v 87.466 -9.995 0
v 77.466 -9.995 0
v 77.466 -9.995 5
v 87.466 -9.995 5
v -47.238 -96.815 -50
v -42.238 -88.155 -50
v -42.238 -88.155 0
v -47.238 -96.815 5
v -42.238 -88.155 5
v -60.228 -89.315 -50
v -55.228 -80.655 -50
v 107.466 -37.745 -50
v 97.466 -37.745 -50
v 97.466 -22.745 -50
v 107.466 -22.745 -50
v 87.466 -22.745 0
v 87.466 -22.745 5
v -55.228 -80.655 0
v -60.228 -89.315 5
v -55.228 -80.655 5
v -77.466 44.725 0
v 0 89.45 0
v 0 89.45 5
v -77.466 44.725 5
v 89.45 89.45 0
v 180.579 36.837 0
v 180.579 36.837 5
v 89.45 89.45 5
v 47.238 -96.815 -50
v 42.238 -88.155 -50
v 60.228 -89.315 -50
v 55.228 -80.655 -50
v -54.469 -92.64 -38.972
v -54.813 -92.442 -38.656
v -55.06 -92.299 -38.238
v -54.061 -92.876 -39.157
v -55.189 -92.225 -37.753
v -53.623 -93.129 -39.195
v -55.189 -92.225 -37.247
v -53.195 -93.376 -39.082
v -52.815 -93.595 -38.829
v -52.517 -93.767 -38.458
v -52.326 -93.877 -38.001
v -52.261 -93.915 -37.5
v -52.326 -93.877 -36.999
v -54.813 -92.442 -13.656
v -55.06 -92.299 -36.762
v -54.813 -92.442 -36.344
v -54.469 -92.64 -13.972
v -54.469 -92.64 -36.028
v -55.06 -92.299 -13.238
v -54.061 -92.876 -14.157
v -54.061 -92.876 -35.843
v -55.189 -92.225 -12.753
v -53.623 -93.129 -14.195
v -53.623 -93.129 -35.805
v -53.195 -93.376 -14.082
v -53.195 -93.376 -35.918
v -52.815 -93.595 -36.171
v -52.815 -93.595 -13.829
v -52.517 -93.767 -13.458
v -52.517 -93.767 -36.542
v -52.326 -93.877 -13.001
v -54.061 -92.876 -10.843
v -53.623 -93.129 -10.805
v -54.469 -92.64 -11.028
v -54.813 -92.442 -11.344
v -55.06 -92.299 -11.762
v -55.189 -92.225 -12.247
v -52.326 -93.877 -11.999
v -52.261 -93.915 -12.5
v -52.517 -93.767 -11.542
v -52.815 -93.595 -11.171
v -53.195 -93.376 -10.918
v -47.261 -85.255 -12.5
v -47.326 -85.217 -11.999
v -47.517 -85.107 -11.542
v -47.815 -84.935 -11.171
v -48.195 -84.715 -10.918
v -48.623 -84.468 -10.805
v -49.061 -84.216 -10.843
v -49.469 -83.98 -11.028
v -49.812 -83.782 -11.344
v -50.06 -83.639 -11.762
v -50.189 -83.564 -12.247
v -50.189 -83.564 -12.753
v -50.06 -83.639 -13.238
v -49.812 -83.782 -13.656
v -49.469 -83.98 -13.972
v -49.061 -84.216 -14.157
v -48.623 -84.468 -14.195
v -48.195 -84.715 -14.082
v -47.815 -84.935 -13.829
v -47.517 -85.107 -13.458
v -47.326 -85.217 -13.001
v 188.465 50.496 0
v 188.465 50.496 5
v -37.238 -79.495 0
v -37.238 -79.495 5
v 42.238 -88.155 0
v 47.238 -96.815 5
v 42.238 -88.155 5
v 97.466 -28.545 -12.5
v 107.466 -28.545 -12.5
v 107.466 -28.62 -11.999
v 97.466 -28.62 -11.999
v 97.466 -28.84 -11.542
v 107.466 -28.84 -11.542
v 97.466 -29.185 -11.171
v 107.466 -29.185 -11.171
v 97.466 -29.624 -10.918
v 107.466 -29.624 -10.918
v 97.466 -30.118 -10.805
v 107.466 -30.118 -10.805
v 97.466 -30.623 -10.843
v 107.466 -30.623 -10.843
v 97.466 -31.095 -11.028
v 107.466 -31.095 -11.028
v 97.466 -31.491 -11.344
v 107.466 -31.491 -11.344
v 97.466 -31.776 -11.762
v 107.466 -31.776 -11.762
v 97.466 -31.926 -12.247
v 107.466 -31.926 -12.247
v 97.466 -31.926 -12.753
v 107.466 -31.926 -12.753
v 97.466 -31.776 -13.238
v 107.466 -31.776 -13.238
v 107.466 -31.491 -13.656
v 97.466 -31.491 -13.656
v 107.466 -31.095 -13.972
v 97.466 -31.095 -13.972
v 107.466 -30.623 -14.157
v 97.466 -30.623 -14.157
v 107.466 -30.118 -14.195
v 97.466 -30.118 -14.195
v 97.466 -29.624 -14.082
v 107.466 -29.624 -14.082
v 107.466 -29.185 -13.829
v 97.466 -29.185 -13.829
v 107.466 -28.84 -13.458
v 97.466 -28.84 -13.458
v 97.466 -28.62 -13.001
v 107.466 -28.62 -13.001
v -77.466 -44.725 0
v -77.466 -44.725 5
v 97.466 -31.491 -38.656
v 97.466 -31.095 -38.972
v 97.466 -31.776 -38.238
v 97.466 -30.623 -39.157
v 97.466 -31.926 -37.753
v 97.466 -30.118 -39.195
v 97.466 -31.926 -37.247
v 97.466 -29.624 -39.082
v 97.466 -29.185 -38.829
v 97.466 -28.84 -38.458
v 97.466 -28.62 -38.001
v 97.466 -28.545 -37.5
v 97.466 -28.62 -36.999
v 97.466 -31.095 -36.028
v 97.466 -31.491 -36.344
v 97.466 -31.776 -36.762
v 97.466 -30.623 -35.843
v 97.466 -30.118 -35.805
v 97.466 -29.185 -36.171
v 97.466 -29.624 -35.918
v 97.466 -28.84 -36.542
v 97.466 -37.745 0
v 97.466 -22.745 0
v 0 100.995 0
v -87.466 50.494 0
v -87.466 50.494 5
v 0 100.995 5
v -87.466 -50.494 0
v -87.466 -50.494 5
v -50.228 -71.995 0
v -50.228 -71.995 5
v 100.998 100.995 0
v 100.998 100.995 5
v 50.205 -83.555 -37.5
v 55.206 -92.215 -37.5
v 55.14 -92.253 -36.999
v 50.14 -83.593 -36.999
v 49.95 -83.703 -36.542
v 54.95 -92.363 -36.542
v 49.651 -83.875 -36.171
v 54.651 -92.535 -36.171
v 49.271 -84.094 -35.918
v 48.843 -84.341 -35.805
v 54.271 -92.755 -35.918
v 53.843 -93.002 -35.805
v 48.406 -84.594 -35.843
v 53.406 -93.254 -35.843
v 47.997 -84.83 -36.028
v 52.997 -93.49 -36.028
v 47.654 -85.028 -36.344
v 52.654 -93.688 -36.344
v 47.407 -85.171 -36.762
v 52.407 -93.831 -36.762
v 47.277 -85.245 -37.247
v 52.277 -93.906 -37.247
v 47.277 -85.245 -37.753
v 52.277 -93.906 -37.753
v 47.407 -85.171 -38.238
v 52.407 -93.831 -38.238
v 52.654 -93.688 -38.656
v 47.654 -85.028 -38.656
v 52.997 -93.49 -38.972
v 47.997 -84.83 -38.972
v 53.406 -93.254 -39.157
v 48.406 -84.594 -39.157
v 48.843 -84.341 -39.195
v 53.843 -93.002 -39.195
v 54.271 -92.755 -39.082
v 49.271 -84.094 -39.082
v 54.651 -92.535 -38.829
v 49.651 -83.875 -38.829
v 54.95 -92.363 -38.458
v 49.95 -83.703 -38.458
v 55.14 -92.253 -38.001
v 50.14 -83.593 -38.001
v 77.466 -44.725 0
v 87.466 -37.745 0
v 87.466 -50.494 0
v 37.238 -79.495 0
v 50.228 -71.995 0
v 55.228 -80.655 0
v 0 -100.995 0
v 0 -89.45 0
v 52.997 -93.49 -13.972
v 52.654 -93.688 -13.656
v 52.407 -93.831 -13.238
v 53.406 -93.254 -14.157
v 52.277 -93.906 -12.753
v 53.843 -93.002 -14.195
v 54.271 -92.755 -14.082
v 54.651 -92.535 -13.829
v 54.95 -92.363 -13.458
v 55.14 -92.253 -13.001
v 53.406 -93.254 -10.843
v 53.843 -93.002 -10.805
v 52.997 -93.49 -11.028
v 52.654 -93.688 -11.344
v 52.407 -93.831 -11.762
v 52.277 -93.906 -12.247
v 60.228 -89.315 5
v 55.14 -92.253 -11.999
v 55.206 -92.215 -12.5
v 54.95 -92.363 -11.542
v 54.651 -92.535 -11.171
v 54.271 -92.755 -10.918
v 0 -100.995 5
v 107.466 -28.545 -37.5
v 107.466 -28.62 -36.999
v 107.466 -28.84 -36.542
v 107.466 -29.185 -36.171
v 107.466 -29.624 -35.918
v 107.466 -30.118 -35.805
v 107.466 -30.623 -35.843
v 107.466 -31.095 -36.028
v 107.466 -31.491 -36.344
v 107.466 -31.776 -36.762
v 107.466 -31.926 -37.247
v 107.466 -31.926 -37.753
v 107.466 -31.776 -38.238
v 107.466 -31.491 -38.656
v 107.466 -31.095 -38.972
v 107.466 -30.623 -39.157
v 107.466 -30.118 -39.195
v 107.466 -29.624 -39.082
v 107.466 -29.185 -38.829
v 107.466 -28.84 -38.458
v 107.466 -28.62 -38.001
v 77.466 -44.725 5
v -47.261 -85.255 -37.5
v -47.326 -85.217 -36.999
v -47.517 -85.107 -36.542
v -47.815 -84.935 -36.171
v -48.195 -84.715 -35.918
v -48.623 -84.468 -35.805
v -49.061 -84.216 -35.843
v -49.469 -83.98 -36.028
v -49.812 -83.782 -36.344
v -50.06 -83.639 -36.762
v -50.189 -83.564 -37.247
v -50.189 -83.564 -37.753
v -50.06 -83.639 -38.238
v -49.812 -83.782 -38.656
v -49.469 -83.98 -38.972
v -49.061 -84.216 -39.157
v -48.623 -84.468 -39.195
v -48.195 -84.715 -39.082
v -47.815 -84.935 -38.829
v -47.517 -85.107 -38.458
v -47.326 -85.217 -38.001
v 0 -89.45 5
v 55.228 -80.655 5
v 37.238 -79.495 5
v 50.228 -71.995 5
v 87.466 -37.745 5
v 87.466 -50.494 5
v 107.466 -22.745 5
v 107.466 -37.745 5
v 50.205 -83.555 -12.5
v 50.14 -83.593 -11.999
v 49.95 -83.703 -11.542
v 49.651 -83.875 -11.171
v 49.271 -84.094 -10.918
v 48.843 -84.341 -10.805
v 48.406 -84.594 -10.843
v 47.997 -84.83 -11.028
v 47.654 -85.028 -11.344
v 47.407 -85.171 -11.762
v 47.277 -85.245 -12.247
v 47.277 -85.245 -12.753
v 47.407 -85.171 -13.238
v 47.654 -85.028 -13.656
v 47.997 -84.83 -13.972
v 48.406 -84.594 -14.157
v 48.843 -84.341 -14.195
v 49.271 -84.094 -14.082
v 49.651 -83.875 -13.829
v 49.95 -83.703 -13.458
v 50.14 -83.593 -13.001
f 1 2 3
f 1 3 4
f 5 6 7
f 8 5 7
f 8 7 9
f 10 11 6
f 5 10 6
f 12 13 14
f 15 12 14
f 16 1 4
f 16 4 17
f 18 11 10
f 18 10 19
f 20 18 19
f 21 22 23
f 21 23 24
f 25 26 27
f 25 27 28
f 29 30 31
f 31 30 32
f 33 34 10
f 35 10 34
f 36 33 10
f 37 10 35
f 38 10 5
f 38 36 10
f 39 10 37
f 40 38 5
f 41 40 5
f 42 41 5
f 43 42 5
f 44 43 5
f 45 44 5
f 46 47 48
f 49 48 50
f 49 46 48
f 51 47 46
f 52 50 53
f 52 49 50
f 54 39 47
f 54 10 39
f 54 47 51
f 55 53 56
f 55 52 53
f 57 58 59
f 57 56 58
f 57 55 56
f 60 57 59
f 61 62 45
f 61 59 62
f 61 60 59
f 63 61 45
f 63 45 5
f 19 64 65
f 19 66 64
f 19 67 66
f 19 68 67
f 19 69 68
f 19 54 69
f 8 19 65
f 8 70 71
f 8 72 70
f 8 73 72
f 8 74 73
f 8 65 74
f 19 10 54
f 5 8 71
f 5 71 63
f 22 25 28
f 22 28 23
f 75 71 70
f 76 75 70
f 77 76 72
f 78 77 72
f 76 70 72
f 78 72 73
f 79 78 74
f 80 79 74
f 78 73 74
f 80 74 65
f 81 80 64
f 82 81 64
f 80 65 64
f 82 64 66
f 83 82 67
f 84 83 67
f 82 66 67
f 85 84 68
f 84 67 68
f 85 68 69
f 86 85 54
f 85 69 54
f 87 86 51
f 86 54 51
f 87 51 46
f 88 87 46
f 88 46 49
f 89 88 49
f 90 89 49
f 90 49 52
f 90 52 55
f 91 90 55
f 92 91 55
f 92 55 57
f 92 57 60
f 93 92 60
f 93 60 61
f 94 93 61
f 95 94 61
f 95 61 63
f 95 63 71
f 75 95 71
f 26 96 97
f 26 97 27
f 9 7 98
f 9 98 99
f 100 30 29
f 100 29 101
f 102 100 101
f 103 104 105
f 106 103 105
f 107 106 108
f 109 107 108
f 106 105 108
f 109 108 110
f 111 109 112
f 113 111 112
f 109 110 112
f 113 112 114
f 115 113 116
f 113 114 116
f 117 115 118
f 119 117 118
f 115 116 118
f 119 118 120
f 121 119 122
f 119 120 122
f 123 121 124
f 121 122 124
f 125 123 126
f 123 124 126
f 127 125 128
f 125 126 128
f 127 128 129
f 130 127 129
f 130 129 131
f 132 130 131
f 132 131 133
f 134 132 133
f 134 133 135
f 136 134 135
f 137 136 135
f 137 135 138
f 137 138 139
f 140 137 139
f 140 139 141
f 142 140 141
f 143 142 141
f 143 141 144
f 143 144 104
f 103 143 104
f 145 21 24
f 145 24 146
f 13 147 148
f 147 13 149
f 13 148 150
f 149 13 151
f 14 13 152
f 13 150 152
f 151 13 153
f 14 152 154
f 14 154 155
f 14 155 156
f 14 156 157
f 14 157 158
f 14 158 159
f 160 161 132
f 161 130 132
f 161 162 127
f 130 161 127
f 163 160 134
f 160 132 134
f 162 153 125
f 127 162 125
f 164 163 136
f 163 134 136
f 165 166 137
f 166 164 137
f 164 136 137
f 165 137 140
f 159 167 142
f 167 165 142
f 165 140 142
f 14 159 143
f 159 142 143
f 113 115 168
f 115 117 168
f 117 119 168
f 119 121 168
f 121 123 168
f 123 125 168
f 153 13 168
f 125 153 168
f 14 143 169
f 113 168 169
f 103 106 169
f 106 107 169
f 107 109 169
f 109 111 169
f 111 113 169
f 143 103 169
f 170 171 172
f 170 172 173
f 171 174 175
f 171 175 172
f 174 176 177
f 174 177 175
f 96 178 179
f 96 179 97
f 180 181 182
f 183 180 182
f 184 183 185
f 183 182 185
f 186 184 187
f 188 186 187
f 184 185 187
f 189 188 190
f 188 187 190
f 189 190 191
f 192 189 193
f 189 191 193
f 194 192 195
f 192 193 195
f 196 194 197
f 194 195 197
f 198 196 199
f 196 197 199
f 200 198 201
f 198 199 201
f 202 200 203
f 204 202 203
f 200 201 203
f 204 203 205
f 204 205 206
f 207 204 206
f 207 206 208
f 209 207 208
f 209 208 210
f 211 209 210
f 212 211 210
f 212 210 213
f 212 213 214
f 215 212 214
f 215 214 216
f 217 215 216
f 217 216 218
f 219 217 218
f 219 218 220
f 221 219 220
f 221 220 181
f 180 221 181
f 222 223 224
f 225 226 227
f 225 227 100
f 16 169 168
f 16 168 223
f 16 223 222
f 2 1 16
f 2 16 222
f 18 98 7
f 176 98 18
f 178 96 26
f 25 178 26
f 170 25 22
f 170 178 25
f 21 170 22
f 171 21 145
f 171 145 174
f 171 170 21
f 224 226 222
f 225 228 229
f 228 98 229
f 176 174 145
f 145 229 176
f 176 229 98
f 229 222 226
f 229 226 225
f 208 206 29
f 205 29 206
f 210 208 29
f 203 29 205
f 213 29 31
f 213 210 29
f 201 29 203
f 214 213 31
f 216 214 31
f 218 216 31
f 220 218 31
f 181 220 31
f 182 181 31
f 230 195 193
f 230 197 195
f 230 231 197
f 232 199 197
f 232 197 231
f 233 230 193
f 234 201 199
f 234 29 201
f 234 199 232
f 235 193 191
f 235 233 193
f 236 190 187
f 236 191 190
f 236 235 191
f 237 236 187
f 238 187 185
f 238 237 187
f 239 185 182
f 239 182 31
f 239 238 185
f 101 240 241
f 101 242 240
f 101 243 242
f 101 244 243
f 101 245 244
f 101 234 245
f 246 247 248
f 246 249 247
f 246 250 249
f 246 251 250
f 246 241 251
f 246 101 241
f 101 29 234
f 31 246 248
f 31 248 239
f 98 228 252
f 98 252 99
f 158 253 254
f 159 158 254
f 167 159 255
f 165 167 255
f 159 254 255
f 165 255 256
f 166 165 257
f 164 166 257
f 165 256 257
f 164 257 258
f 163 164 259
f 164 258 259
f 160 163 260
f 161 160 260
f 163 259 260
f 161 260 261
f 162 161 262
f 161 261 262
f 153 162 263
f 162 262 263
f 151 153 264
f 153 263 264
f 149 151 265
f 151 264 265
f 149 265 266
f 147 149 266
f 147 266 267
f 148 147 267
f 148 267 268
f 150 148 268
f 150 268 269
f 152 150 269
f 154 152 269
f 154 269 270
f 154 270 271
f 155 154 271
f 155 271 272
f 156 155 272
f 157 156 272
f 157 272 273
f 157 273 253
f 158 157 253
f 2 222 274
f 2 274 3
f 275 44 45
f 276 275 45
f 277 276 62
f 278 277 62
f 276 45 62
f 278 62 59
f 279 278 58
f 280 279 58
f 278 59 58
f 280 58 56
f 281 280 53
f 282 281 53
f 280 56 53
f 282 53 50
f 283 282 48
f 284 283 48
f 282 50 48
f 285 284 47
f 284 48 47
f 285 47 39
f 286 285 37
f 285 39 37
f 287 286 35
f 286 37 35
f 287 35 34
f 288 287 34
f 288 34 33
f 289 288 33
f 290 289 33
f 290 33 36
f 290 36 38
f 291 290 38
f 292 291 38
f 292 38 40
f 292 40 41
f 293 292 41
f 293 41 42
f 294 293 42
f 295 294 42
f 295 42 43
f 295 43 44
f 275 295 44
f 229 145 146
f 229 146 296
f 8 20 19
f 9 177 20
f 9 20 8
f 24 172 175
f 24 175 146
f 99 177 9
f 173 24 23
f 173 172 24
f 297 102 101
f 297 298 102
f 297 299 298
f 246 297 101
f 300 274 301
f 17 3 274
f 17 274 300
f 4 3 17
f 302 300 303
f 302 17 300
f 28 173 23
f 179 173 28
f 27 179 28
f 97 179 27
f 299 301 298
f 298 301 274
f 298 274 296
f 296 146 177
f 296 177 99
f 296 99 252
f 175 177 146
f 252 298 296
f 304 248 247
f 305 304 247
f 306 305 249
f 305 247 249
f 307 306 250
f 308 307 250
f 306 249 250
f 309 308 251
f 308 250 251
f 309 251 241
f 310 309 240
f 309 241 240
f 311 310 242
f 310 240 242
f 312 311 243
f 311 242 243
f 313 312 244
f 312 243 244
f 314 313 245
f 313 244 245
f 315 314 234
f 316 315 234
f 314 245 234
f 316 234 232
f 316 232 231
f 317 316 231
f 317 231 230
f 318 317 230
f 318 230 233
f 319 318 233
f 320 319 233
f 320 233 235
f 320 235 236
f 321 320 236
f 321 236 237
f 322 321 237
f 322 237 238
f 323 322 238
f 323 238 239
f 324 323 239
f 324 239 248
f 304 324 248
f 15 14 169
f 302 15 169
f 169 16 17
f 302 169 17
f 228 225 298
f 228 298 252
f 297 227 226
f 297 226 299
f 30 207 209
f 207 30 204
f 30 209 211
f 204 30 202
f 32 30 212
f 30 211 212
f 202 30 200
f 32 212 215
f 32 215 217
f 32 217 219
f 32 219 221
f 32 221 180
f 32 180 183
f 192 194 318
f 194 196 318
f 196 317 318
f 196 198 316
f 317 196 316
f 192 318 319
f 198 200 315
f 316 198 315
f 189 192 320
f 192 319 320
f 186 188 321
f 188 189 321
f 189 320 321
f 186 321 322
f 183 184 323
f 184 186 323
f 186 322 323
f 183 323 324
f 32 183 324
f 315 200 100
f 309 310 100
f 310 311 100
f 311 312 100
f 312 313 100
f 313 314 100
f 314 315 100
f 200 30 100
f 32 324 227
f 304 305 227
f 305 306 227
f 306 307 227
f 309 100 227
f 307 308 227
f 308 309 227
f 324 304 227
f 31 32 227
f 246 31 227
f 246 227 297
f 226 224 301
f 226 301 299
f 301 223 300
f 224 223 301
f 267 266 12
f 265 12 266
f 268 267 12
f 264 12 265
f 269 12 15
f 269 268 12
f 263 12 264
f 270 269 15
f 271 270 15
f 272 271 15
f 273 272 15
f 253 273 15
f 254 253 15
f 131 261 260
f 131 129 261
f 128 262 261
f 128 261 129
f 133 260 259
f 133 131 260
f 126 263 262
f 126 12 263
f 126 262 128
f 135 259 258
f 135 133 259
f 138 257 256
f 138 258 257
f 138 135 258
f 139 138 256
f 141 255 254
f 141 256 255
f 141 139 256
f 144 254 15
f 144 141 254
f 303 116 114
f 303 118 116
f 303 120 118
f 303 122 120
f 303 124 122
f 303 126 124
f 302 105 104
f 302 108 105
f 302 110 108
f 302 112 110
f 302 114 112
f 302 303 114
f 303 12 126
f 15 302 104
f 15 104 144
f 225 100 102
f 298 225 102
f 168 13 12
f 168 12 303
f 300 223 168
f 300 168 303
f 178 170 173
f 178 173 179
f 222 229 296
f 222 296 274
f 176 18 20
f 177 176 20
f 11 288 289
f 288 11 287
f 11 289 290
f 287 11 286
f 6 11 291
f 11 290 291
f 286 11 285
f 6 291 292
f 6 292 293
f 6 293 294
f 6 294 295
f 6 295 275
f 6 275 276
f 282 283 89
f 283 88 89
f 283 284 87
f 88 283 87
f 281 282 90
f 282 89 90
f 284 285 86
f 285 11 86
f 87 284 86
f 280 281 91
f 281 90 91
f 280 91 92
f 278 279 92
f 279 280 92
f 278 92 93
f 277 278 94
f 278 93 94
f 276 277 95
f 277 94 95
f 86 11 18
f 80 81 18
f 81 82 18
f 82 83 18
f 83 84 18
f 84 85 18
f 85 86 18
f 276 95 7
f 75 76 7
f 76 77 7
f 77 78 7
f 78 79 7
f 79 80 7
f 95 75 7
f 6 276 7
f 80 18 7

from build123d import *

# Parameters (mm, degrees)
PAD_DEPTH      = 5
SKETCH001_W    = 15
SKETCH001_H    = 5
PAD001_DEPTH   = 10
SKETCH002_W    = 15
SKETCH002_H    = 5
PAD002_DEPTH   = 10
SKETCH003_W    = 15
SKETCH003_H    = 5
PAD003_DEPTH   = 10
SKETCH004_W    = 15
SKETCH004_H    = 55
PAD004_DEPTH   = 10
SKETCH005_R    = 1.7
HOLE_DEPTH     = 25
HOLE_TIPS_R    = 1.7
SKETCH006_W    = 15
SKETCH006_H    = 55
PAD005_DEPTH   = 10
SKETCH007_R    = 1.7
HOLE001_DEPTH  = 25
HOLE001_TIPS_R = 1.7
SKETCH008_W    = 15
SKETCH008_H    = 55
PAD006_DEPTH   = 10
SKETCH009_R    = 1.7
HOLE002_DEPTH  = 25
HOLE002_TIPS_R = 1.7


with BuildPart() as part:
    # Sketch → Pad (new body)
    with BuildSketch(Plane.XY):
        Polygon((77.465972, -44.725), (77.465972, -9.995), (87.465972, -9.995), (87.465972, -50.494492), (0, -100.995), (-87.465972, -50.494492), (-87.465972, 50.494492), (0, 100.995), (100.998008, 100.995), (188.464849, 50.495996), (180.578715, 36.836812), (89.45, 89.45), (0, 89.45), (-77.465972, 44.725), (-77.465972, -44.725), (0, -89.45), align=None)
    extrude(amount=PAD_DEPTH)

    # Sketch001 (on Face12 of Pad) → Pad001 (join)
    with BuildSketch(Plane.YZ.offset(87.465972)):
        with Locations((-30.244746, 2.5)):
            Rectangle(SKETCH001_W, SKETCH001_H)
    extrude(amount=PAD001_DEPTH)

    # Sketch002 (on Face19 of Pad001) → Pad002 (join)
    with BuildSketch(Plane(origin=(43.732986, -75.744746, 0), x_dir=(0.866017, 0.500015, 0), z_dir=(0.500015, -0.866017, 0))):
        with Locations((0, 2.5)):
            Rectangle(SKETCH002_W, SKETCH002_H)
    extrude(amount=PAD002_DEPTH)

    # Sketch003 (on Face22 of Pad002) → Pad003 (join)
    with BuildSketch(Plane(origin=(-43.732986, -75.744746, 0), x_dir=(0.866017, -0.500015, 0), z_dir=(-0.500015, -0.866017, 0))):
        with Locations((0, 2.5)):
            Rectangle(SKETCH003_W, SKETCH003_H)
    extrude(amount=PAD003_DEPTH)

    # Sketch004 (on Face30 of Pad003) → Pad004 (join)
    with BuildSketch(Plane.YZ.offset(97.465972)):
        with Locations((-30.244746, -22.5)):
            Rectangle(SKETCH004_W, SKETCH004_H)
    extrude(amount=PAD004_DEPTH)

    # Sketch005 (on Face41 of Pad004) → Hole (cut)
    with BuildSketch(Plane.YZ.offset(107.465972)):
        with Locations((-30.244746, -37.5)):
            Circle(SKETCH005_R)
        with Locations((-30.244746, -12.5)):
            Circle(SKETCH005_R)
    extrude(amount=-HOLE_DEPTH, mode=Mode.SUBTRACT)

    # Hole tips → Hole tip 1 section 0
    with BuildSketch(Plane.YZ.offset(82.465972), mode=Mode.PRIVATE) as hole_tip_1_s0:
        with Locations((-30.244746, -37.5)):
            Circle(HOLE_TIPS_R)
    loft([hole_tip_1_s0.sketch, Vertex(81.444509, -30.244746, -37.5)], mode=Mode.SUBTRACT)

    # Hole tips → Hole tip 2 section 0
    with BuildSketch(Plane.YZ.offset(82.465972), mode=Mode.PRIVATE) as hole_tip_2_s0:
        with Locations((-30.244746, -12.5)):
            Circle(HOLE_TIPS_R)
    loft([hole_tip_2_s0.sketch, Vertex(81.444509, -30.244746, -12.5)], mode=Mode.SUBTRACT)

    # Sketch006 (on Face33 of Hole) → Pad005 (join)
    with BuildSketch(Plane(origin=(48.733135, -84.404914, 0), x_dir=(0.866017, 0.500015, 0), z_dir=(0.500015, -0.866017, 0))):
        with Locations((0, -22.5)):
            Rectangle(SKETCH006_W, SKETCH006_H)
    extrude(amount=PAD005_DEPTH)

    # Sketch007 (on Face48 of Pad005) → Hole001 (cut)
    with BuildSketch(Plane(origin=(53.733284, -93.065082, 0), x_dir=(0.866017, 0.500015, 0), z_dir=(0.500015, -0.866017, 0))):
        with Locations((0, -37.5)):
            Circle(SKETCH007_R)
        with Locations((0, -12.5)):
            Circle(SKETCH007_R)
    extrude(amount=-HOLE001_DEPTH, mode=Mode.SUBTRACT)

    # Hole001 tips → Hole001 tip 1 section 0
    with BuildSketch(Plane(origin=(41.232912, -71.414662, 0), x_dir=(0.866017, 0.500015, 0), z_dir=(0.500015, -0.866017, 0)), mode=Mode.PRIVATE) as hole001_tip_1_s0:
        with Locations((0, -37.5)):
            Circle(HOLE001_TIPS_R)
    loft([hole001_tip_1_s0.sketch, Vertex(40.722165, -70.530058, -37.5)], mode=Mode.SUBTRACT)

    # Hole001 tips → Hole001 tip 2 section 0
    with BuildSketch(Plane(origin=(41.232912, -71.414662, 0), x_dir=(0.866017, 0.500015, 0), z_dir=(0.500015, -0.866017, 0)), mode=Mode.PRIVATE) as hole001_tip_2_s0:
        with Locations((0, -12.5)):
            Circle(HOLE001_TIPS_R)
    loft([hole001_tip_2_s0.sketch, Vertex(40.722165, -70.530058, -12.5)], mode=Mode.SUBTRACT)

    # Sketch008 (on Face36 of Hole001) → Pad006 (join)
    with BuildSketch(Plane(origin=(-48.733135, -84.404914, 0), x_dir=(0.866017, -0.500015, 0), z_dir=(-0.500015, -0.866017, 0))):
        with Locations((0, -22.5)):
            Rectangle(SKETCH008_W, SKETCH008_H)
    extrude(amount=PAD006_DEPTH)

    # Sketch009 (on Face55 of Pad006) → Hole002 (cut)
    with BuildSketch(Plane(origin=(-53.733284, -93.065082, 0), x_dir=(0.866017, -0.500015, 0), z_dir=(-0.500015, -0.866017, 0))):
        with Locations((0, -12.5)):
            Circle(SKETCH009_R)
        with Locations((0, -37.5)):
            Circle(SKETCH009_R)
    extrude(amount=-HOLE002_DEPTH, mode=Mode.SUBTRACT)

    # Hole002 tips → Hole002 tip 1 section 0
    with BuildSketch(Plane(origin=(-41.232912, -71.414662, 0), x_dir=(0.866017, -0.500015, 0), z_dir=(-0.500015, -0.866017, 0)), mode=Mode.PRIVATE) as hole002_tip_1_s0:
        with Locations((0, -12.5)):
            Circle(HOLE002_TIPS_R)
    loft([hole002_tip_1_s0.sketch, Vertex(-40.722165, -70.530058, -12.5)], mode=Mode.SUBTRACT)

    # Hole002 tips → Hole002 tip 2 section 0
    with BuildSketch(Plane(origin=(-41.232912, -71.414662, 0), x_dir=(0.866017, -0.500015, 0), z_dir=(-0.500015, -0.866017, 0)), mode=Mode.PRIVATE) as hole002_tip_2_s0:
        with Locations((0, -37.5)):
            Circle(HOLE002_TIPS_R)
    loft([hole002_tip_2_s0.sketch, Vertex(-40.722165, -70.530058, -37.5)], mode=Mode.SUBTRACT)


solid = part.part
